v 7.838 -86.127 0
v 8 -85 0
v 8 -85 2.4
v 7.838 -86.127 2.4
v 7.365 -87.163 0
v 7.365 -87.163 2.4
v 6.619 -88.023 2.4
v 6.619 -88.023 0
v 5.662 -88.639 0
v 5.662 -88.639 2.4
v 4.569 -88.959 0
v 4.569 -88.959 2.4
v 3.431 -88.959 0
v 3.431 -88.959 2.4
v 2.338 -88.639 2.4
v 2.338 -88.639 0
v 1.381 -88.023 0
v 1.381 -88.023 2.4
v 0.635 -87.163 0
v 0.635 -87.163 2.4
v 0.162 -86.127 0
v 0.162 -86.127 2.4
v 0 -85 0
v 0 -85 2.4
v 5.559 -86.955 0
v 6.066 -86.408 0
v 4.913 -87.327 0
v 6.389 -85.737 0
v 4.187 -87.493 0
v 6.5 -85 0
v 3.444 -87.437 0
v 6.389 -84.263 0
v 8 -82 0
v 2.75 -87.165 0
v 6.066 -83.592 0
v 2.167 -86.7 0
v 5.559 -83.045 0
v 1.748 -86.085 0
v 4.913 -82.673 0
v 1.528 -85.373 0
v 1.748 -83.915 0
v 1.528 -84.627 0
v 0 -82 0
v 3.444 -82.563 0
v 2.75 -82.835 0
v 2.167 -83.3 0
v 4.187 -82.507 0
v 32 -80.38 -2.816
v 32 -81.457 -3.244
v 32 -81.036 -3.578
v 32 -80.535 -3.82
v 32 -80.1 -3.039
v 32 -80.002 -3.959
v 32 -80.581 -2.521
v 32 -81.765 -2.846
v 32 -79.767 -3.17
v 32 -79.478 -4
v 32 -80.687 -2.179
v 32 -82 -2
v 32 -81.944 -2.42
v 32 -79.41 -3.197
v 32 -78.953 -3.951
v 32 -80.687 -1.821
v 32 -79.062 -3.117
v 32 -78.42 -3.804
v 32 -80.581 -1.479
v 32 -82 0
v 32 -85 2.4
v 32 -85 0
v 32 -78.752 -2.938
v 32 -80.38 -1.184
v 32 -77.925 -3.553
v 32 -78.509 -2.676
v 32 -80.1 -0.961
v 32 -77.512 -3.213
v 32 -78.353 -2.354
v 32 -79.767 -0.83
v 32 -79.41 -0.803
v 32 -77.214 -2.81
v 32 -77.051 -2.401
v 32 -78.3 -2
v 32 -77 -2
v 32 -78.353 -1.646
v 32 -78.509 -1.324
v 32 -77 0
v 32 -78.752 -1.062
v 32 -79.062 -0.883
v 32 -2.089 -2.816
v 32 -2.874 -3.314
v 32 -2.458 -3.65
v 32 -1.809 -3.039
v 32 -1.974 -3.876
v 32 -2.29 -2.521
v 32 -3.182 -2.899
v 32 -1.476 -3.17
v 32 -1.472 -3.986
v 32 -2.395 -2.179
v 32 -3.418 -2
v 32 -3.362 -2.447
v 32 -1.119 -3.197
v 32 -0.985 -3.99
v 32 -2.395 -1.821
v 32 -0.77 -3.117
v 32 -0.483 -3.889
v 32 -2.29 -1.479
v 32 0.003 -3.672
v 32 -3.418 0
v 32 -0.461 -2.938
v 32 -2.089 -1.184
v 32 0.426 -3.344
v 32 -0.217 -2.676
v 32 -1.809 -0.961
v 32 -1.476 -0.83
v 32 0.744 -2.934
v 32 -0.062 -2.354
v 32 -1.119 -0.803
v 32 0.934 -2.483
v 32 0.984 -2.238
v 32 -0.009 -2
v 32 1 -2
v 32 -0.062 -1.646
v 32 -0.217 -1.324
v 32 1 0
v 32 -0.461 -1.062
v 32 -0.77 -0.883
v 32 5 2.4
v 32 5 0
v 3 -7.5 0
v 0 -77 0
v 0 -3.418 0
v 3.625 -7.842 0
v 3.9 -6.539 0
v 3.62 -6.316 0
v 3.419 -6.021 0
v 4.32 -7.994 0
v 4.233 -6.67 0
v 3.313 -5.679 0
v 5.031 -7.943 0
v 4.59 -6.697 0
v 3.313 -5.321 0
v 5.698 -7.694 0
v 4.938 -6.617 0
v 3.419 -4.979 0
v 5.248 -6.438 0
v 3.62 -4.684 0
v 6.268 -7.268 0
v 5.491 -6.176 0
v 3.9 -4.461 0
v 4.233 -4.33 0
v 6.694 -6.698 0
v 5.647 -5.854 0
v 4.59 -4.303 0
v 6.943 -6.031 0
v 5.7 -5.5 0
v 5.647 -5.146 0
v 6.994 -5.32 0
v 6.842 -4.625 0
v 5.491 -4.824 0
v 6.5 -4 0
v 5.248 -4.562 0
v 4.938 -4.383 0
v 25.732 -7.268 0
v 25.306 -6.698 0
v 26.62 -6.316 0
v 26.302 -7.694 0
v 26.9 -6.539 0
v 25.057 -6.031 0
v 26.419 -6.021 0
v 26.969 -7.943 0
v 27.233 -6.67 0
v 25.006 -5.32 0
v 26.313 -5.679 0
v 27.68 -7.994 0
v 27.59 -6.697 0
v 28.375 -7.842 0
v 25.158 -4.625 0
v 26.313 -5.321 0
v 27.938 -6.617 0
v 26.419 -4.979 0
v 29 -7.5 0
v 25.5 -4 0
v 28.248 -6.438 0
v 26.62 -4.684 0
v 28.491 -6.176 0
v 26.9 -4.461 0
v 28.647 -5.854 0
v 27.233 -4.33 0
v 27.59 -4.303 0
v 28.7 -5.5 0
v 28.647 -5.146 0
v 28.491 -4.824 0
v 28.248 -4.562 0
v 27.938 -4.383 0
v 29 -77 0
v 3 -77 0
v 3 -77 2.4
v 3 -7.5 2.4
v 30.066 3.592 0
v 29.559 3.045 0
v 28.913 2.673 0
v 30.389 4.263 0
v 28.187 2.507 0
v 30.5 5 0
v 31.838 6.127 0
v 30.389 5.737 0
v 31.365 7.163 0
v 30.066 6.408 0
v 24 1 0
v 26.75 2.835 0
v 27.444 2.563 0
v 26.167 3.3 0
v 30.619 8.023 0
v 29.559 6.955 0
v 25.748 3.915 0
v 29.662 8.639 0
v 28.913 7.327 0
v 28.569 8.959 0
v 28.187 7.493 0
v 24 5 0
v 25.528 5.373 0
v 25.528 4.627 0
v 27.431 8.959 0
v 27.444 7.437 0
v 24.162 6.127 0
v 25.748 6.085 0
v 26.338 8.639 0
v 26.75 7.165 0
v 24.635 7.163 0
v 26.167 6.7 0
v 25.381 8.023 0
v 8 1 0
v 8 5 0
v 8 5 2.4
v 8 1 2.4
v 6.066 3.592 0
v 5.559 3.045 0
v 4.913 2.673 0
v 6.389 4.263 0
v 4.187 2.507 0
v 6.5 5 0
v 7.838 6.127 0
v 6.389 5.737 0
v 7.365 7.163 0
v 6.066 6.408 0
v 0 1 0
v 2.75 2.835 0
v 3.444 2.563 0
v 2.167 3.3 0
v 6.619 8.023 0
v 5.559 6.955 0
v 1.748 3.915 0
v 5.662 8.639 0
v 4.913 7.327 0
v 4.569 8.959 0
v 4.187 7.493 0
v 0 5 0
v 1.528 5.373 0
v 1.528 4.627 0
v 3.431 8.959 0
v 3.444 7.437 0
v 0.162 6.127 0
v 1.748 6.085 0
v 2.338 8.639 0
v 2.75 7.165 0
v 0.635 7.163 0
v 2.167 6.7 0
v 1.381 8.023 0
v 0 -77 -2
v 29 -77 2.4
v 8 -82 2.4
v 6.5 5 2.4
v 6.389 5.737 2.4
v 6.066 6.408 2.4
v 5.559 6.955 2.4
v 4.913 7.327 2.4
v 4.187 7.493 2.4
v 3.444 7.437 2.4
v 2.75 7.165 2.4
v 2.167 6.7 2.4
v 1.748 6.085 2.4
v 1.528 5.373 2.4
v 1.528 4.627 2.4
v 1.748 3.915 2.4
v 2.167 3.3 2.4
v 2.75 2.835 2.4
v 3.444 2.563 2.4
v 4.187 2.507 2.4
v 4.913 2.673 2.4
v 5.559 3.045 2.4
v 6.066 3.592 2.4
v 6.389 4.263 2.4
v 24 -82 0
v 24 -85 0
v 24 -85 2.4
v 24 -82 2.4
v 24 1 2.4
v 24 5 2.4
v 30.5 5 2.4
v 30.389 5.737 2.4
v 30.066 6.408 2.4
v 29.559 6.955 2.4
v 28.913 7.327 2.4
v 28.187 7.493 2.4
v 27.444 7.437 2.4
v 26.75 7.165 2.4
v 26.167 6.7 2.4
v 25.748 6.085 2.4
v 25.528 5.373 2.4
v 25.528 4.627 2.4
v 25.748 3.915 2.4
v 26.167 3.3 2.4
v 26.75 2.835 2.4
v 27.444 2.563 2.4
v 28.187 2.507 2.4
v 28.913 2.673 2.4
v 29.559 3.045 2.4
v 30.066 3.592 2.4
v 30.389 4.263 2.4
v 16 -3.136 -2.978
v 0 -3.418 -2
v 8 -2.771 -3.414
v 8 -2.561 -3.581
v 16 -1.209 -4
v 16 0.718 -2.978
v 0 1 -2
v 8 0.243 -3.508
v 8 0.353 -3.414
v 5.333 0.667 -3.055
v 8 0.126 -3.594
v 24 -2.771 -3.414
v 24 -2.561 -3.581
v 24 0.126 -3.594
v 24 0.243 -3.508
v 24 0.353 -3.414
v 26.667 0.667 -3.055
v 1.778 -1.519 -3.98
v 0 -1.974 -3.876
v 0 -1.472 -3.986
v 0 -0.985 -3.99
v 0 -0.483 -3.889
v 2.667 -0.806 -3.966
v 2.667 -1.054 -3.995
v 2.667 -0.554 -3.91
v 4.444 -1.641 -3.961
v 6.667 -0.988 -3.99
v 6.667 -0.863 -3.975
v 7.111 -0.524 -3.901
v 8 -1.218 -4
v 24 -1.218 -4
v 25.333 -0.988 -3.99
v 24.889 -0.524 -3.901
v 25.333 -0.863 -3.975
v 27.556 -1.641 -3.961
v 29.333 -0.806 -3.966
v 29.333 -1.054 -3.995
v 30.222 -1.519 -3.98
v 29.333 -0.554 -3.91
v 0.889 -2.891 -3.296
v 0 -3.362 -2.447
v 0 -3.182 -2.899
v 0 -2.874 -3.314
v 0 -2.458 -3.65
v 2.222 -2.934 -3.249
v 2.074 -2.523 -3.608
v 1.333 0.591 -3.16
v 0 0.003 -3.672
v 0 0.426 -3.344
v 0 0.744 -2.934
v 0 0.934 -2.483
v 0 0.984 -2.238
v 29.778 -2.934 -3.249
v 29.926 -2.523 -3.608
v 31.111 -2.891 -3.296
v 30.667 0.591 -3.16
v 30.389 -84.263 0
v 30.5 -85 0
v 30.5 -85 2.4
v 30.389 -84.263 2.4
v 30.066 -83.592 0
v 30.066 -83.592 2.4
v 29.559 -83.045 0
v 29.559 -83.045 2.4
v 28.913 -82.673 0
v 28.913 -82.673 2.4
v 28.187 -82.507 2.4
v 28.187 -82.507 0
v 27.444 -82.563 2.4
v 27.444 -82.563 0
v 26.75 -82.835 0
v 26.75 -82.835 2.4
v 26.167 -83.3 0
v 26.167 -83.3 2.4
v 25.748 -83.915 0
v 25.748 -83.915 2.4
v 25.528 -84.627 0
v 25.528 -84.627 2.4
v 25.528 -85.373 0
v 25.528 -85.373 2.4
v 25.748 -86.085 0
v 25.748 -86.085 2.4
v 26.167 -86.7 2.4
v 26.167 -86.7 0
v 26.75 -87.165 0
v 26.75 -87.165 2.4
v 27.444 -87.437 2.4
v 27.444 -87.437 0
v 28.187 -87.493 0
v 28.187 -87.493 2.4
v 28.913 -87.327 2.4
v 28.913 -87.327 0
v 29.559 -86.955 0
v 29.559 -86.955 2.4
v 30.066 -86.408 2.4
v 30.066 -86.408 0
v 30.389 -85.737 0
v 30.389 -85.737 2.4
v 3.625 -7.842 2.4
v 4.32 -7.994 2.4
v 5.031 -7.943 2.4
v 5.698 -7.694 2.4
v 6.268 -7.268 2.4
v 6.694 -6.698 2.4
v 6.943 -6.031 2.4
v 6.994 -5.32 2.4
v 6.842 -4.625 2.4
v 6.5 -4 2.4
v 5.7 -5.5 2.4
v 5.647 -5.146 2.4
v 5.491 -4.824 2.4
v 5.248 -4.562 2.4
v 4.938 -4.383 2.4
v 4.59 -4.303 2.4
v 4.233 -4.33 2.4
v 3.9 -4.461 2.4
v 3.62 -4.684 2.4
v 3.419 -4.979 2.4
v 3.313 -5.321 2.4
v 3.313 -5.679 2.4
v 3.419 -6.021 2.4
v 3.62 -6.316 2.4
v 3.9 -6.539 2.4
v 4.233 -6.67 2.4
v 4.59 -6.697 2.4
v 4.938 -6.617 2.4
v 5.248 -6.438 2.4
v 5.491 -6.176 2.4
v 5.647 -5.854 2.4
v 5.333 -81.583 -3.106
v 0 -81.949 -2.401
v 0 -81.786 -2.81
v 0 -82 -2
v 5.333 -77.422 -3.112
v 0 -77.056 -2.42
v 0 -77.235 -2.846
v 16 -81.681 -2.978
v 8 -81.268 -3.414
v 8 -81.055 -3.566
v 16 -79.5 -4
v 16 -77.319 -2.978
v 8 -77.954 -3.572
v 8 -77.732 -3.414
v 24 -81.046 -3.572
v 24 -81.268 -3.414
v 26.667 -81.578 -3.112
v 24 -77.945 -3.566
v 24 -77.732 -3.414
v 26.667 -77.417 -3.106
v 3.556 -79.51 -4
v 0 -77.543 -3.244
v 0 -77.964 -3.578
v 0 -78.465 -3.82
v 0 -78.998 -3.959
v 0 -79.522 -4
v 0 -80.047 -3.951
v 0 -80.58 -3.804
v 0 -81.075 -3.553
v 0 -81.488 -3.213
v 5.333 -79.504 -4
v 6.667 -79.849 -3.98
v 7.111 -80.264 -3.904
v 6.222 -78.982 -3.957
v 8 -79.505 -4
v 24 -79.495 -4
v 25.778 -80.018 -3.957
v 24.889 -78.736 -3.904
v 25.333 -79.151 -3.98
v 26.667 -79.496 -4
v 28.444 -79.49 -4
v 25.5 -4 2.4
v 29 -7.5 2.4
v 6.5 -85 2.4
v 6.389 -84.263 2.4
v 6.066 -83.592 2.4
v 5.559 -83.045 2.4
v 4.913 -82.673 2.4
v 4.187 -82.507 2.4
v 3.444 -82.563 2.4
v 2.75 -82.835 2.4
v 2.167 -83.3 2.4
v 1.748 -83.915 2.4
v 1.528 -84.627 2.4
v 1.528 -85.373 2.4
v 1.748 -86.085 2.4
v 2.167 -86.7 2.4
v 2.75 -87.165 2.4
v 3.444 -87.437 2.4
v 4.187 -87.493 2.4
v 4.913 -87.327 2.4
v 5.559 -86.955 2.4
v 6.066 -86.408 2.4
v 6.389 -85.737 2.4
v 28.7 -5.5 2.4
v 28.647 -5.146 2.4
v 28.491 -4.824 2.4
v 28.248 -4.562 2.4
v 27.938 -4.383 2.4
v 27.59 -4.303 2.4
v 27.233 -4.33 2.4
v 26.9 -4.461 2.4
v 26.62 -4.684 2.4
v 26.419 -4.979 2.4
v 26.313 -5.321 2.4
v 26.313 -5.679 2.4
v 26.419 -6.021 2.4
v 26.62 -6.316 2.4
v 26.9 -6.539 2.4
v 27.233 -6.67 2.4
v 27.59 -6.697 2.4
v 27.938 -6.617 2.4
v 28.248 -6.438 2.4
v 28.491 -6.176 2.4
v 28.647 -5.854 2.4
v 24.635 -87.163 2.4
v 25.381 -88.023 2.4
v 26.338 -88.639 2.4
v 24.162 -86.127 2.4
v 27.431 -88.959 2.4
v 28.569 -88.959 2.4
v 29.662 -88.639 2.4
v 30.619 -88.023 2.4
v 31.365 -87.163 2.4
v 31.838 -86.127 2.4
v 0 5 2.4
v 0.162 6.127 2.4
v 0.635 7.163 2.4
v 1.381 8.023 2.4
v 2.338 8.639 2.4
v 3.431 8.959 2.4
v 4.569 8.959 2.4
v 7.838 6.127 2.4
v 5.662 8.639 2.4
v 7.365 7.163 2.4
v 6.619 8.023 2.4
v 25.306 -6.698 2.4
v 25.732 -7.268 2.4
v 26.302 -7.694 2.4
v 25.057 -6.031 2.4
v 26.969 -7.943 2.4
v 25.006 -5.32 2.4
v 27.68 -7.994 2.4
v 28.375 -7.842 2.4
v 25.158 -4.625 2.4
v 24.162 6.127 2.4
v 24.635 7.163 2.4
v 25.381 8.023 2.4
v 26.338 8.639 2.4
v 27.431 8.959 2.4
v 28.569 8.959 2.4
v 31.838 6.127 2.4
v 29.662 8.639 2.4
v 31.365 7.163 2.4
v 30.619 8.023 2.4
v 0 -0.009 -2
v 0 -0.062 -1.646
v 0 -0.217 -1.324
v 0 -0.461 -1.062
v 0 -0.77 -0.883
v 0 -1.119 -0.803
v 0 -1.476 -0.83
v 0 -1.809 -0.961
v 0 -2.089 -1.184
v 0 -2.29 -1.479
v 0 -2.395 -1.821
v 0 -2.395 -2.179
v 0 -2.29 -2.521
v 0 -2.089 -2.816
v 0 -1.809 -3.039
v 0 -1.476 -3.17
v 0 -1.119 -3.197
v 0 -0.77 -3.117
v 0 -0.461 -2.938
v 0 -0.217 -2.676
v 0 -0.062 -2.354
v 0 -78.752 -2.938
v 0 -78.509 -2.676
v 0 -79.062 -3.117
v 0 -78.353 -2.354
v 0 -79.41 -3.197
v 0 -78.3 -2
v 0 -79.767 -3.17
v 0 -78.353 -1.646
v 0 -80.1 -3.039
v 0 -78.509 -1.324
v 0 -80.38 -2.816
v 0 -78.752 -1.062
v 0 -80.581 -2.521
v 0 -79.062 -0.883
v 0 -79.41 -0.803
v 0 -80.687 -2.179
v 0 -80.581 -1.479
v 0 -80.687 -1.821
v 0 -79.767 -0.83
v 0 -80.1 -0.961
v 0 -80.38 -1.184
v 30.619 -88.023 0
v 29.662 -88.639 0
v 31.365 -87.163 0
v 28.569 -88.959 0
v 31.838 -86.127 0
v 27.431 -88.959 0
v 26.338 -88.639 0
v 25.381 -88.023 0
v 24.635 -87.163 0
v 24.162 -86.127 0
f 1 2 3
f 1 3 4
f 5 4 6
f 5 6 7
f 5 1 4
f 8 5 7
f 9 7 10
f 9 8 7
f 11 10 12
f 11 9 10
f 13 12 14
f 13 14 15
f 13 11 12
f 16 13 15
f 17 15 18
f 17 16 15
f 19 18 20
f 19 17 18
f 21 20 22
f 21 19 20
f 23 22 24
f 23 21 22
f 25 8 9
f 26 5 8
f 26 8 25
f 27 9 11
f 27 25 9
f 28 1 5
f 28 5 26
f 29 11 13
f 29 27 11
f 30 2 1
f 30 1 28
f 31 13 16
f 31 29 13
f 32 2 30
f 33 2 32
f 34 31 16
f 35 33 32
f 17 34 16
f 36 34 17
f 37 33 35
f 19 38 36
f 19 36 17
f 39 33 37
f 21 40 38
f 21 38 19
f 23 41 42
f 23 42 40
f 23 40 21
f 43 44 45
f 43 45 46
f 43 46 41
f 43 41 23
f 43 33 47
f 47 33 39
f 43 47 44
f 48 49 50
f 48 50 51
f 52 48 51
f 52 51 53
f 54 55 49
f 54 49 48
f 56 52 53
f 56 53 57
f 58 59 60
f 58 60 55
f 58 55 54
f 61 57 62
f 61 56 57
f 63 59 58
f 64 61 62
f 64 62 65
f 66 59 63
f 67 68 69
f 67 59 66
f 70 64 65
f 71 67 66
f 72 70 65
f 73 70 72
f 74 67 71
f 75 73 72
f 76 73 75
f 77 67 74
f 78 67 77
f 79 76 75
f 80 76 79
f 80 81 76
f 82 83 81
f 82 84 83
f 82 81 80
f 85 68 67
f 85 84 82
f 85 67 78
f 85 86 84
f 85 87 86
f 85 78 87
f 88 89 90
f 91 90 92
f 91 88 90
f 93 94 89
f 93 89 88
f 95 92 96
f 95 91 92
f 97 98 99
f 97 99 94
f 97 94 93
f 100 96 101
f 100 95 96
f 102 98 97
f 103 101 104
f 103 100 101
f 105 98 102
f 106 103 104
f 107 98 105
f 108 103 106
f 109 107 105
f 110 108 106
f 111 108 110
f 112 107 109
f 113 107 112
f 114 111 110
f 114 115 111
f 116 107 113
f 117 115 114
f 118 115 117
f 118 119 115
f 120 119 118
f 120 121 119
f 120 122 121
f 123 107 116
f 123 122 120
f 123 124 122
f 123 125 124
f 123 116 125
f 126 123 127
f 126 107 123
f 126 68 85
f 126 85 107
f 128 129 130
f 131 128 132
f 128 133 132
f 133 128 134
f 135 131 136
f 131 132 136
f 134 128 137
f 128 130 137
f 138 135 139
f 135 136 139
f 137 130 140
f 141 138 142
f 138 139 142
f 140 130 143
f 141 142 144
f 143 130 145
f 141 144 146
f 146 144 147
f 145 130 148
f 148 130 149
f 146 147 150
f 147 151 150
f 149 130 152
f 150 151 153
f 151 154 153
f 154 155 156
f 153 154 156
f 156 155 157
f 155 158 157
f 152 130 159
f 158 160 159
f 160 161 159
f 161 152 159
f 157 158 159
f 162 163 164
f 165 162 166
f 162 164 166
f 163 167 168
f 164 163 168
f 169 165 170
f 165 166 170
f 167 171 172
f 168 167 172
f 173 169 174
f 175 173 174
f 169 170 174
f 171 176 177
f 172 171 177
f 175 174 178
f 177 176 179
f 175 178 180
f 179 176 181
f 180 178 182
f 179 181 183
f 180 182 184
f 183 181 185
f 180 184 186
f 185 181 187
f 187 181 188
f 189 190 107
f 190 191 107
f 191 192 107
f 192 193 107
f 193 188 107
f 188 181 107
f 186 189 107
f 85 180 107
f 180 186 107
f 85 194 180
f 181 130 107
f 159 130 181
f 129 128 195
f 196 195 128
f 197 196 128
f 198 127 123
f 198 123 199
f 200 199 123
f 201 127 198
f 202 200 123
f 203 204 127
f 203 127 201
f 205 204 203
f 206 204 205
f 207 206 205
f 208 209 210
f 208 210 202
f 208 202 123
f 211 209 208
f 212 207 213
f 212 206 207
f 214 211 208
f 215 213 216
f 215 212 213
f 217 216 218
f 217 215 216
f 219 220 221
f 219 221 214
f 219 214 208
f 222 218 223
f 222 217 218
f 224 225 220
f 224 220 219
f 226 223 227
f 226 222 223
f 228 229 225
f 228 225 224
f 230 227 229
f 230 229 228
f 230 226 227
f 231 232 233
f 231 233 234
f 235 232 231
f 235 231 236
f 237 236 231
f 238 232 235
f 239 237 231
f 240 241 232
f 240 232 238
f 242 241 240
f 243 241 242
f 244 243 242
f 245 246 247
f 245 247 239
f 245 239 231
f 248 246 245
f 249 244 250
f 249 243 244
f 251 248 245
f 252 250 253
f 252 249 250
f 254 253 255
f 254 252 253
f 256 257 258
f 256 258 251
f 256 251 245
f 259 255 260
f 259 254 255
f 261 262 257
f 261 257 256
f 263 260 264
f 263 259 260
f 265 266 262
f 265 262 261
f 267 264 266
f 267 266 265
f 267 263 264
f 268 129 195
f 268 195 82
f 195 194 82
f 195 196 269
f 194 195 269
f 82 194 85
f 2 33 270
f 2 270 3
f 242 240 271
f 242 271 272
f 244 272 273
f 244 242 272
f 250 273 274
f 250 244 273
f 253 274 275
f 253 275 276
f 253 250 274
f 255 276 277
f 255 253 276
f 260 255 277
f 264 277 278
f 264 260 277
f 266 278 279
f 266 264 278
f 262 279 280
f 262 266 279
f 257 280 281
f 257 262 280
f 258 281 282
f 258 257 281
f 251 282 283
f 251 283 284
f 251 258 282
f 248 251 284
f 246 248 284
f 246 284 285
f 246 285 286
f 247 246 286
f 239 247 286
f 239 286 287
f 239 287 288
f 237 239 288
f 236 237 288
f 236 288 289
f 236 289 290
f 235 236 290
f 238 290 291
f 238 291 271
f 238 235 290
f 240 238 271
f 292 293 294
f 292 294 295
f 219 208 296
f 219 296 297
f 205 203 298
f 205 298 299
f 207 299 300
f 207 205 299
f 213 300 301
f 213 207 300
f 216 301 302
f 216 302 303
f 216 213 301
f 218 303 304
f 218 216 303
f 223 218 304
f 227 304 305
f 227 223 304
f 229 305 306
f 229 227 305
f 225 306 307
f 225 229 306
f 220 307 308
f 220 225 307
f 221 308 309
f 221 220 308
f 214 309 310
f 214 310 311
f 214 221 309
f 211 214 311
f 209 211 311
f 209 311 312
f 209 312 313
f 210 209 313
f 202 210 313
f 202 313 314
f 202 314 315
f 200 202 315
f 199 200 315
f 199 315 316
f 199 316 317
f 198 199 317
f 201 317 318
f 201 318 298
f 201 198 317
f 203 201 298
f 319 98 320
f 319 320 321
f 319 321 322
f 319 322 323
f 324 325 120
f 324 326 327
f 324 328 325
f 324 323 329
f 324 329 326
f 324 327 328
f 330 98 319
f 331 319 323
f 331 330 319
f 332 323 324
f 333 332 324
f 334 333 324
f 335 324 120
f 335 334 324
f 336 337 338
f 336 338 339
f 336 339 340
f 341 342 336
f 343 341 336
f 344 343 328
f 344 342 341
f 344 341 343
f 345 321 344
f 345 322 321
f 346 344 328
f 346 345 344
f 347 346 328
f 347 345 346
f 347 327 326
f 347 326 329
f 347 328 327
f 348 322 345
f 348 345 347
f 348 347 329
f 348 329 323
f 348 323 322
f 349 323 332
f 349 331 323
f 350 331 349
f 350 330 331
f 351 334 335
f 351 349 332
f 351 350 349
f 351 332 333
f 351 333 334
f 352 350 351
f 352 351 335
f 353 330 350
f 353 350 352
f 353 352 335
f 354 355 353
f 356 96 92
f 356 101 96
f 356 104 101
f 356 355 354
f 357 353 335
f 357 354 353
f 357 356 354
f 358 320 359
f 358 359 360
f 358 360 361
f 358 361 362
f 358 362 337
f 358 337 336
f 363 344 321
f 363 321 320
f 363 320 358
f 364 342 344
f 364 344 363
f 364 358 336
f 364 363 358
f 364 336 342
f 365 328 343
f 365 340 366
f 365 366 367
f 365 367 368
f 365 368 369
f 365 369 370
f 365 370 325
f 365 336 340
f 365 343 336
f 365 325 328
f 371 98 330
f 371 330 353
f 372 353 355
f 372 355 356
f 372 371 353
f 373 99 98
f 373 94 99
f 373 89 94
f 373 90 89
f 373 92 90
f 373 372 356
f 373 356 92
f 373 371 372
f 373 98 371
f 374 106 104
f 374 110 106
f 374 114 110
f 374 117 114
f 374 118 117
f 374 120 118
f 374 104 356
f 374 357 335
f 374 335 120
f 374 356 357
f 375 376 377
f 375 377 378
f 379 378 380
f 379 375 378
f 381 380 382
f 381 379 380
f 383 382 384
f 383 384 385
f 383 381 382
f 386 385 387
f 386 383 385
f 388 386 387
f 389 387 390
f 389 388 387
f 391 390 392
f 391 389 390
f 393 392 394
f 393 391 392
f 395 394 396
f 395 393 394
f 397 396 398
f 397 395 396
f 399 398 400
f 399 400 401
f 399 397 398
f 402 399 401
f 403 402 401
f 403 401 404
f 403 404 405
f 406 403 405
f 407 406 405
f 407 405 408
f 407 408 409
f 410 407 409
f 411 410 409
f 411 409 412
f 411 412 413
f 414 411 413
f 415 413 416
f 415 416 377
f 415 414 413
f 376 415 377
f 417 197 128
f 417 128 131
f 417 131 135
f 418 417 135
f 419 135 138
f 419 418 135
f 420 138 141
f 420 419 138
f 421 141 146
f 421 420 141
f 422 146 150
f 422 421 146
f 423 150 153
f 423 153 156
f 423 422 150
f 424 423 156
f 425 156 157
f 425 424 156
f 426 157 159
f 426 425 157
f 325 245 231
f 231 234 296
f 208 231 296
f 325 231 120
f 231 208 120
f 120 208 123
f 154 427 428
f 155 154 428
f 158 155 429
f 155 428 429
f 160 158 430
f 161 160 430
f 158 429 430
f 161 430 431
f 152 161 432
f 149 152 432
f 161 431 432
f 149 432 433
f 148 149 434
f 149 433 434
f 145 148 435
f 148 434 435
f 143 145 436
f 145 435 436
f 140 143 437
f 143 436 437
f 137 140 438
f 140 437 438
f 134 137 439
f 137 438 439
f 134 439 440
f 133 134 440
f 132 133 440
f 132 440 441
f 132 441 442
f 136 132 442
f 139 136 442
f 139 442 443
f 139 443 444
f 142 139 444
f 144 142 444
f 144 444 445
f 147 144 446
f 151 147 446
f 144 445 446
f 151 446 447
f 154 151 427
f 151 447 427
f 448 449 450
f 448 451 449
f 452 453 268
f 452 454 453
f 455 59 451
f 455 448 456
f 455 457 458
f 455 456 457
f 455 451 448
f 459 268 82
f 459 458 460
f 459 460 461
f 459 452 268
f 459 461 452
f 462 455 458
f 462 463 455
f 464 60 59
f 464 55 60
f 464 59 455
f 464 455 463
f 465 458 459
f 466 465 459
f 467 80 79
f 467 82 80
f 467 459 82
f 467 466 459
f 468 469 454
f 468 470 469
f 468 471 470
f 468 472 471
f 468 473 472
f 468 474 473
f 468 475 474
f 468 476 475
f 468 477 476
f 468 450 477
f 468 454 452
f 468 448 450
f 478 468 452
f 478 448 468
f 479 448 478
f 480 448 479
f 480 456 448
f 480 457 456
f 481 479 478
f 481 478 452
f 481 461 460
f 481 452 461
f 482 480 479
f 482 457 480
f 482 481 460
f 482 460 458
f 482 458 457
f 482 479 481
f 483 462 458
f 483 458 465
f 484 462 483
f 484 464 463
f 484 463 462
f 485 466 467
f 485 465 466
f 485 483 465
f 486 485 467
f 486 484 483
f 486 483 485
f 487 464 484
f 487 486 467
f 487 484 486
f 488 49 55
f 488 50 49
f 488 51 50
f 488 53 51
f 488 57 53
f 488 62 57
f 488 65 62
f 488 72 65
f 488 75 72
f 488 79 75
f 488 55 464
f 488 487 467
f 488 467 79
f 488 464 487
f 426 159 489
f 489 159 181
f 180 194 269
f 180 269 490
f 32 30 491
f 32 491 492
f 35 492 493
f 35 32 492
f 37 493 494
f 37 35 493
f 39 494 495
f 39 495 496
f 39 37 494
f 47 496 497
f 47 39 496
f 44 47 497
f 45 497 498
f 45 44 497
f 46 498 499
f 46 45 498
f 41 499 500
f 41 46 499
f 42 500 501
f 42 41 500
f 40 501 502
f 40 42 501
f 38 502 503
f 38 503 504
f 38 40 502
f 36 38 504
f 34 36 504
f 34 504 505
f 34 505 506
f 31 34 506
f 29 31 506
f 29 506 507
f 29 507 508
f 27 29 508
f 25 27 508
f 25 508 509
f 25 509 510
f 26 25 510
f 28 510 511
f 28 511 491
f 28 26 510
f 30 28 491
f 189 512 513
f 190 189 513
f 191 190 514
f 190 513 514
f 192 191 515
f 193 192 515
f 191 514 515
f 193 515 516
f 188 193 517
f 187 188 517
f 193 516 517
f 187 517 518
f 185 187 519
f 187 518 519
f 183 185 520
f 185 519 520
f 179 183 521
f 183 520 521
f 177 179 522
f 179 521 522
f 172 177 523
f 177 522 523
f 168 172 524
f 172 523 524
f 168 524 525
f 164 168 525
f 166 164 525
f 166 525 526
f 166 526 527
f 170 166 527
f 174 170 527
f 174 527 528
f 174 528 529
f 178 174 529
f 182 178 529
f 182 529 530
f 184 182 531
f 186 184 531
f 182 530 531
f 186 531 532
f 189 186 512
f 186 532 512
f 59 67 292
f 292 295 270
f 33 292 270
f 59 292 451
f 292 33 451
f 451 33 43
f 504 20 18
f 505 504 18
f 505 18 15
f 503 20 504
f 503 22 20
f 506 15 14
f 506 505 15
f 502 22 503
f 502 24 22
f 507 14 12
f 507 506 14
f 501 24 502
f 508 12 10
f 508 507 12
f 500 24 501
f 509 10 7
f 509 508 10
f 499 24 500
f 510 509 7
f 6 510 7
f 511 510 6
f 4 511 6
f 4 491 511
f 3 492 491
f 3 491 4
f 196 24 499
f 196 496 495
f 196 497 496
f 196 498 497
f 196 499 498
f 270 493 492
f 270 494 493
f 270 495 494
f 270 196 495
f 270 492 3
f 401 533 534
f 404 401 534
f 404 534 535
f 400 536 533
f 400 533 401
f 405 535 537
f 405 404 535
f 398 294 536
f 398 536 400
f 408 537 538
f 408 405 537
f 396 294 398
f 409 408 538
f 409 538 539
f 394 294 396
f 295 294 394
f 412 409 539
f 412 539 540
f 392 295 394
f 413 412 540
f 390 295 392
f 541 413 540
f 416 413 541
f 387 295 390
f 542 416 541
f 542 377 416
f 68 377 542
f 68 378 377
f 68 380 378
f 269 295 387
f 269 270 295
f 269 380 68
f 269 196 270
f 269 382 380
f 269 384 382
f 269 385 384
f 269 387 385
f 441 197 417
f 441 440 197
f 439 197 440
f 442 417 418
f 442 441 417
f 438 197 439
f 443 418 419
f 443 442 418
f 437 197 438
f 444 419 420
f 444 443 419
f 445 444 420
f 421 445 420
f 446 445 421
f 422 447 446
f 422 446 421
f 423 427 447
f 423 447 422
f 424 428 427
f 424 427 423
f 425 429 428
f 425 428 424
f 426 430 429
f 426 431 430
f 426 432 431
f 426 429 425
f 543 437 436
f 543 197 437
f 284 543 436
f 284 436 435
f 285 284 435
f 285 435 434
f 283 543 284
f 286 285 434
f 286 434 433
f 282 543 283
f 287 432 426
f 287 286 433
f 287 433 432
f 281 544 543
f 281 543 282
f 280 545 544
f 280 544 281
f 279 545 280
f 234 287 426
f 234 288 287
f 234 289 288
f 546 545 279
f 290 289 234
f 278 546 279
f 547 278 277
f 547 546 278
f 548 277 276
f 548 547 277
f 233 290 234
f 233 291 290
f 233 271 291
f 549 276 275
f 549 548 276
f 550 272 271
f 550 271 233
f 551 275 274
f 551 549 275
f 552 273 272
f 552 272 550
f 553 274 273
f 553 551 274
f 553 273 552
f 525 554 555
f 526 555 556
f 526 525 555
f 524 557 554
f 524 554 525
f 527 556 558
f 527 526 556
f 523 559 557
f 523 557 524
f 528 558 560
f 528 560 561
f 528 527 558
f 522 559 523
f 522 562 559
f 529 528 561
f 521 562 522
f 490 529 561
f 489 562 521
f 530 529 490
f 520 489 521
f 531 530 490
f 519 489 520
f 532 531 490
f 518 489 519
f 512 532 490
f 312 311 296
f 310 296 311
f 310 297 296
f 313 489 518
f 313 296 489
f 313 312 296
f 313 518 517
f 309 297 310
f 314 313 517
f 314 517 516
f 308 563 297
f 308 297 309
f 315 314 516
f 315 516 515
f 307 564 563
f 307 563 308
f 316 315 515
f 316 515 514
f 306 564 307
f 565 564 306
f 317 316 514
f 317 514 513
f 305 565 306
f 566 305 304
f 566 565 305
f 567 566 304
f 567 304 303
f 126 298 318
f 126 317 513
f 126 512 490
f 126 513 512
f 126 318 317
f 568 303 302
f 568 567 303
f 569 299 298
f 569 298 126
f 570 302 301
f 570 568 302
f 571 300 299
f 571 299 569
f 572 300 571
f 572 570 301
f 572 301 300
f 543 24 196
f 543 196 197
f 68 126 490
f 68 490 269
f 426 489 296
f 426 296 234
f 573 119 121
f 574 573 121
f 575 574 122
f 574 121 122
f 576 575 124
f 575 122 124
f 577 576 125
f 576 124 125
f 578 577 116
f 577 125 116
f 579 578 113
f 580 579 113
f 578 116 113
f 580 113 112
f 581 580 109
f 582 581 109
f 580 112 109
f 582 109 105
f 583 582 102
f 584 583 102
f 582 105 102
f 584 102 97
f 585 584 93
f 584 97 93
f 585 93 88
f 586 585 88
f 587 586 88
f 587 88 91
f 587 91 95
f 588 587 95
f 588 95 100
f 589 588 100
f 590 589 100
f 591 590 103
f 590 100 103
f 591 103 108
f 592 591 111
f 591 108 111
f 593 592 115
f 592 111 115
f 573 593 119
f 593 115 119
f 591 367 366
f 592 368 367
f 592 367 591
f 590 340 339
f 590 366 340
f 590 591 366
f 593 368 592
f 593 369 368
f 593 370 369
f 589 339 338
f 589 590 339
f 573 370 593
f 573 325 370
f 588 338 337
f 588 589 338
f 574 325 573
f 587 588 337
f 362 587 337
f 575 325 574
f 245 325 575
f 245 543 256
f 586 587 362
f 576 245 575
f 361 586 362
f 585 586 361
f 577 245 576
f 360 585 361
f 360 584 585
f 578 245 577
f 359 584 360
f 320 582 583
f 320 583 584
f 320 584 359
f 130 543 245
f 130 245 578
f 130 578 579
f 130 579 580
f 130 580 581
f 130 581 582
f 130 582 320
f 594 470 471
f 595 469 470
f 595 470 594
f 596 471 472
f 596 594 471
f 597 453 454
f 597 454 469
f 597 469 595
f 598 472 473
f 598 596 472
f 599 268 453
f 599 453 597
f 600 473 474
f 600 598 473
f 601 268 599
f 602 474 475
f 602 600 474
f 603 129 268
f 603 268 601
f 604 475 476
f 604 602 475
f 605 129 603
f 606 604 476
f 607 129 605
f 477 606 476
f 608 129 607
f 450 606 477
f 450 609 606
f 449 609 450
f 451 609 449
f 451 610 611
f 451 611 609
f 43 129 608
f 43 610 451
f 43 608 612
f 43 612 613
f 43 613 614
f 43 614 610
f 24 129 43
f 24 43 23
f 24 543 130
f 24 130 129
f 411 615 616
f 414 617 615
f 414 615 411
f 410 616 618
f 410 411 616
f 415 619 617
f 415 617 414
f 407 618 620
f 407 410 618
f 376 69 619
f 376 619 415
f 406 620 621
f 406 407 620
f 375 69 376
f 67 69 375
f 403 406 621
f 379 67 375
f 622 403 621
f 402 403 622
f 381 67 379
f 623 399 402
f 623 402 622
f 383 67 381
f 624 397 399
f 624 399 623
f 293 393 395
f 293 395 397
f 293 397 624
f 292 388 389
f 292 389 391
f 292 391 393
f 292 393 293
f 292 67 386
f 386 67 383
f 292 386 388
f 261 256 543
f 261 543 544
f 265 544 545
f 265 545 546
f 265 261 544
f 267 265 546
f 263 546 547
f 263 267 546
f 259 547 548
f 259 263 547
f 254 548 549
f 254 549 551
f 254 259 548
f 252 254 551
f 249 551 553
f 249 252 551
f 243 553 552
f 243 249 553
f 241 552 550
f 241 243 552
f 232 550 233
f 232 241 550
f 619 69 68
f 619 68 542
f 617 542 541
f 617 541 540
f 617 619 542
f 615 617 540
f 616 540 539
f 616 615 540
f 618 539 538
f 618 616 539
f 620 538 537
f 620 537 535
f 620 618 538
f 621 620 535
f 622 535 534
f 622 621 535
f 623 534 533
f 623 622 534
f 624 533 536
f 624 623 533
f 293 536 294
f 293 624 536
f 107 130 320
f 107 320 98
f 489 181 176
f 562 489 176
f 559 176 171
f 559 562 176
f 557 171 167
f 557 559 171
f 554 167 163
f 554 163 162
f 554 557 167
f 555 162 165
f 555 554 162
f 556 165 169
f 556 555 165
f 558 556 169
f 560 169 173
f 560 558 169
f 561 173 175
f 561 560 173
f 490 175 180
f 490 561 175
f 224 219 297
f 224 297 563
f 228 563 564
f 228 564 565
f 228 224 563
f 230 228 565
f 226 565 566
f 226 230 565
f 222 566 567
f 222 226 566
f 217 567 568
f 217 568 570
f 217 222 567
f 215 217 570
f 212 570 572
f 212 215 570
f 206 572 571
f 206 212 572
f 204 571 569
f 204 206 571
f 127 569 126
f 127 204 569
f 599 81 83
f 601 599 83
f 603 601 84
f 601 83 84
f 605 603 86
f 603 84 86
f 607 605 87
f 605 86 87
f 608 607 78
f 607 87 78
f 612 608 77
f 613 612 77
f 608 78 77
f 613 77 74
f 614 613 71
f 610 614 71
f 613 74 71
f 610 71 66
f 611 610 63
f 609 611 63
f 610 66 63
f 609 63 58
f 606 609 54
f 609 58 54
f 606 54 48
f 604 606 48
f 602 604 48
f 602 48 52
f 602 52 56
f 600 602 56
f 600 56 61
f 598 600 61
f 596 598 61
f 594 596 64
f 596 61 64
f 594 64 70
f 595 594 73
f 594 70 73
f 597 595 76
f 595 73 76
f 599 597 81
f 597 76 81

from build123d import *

# Parameters (mm, degrees)
SKETCH1_R           = 2.5
SKETCH1_W           = 26
SKETCH1_H           = 73
BOSS_EXTRUDE1_DEPTH = 2.4
BOSS_EXTRUDE2_DEPTH = 4
SKETCH4_R           = 1.2
CUT_EXTRUDE1_DEPTH  = 32
SKETCH5_R           = 1.2
CUT_EXTRUDE2_DEPTH  = 32
SKETCH6_R           = 2.5
BOSS_EXTRUDE3_DEPTH = 2.4
SKETCH7_R           = 1.2
CUT_EXTRUDE3_DEPTH  = 2.4


with BuildPart() as part:
    # Sketch1 → Boss-Extrude1 (new body)
    with BuildSketch(Plane.XY):
        with BuildLine():
            Line((8, 1), (24, 1))
            Line((24, 1), (24, 5))
            ThreePointArc((24, 5), (28, 9), (32, 5))
            Line((32, 5), (32, 0))
            Line((32, 0), (32, -80))
            Line((32, -80), (32, -85))
            ThreePointArc((32, -85), (28, -89), (24, -85))
            Line((24, -85), (24, -82))
            Line((24, -82), (8, -82))
            Line((8, -82), (8, -85))
            ThreePointArc((8, -85), (4, -89), (0, -85))
            Line((0, -85), (0, -80))
            Line((0, -80), (0, 0))
            Line((0, 0), (0, 5))
            ThreePointArc((0, 5), (4, 9), (8, 5))
            Line((8, 5), (8, 1))
        make_face()
        with Locations((4, 5)):
            Circle(SKETCH1_R, mode=Mode.SUBTRACT)
        with Locations((28, 5)):
            Circle(SKETCH1_R, mode=Mode.SUBTRACT)
        with Locations((28, -85)):
            Circle(SKETCH1_R, mode=Mode.SUBTRACT)
        with Locations((4, -85)):
            Circle(SKETCH1_R, mode=Mode.SUBTRACT)
        with Locations((16, -40.5)):
            Rectangle(SKETCH1_W, SKETCH1_H, mode=Mode.SUBTRACT)
    extrude(amount=BOSS_EXTRUDE1_DEPTH)

    # Sketch3 → Boss-Extrude2 (add)
    with BuildSketch(Plane(origin=(0, 0, 0), x_dir=(-1, 0, 0), z_dir=(0, 0, -1))):
        Polygon((0, -3.417769462), (-32, -3.417769462), (-32, 1), (-24, 1), (0, 1), align=None)
        Polygon((-29, -77), (-8, -77), (0, -77), (0, -82), (-8, -82), (-32, -82), (-32, -77), align=None)
    extrude(amount=BOSS_EXTRUDE2_DEPTH)

    # Sketch4 → Cut-Extrude1 (cut)
    with BuildSketch(Plane(origin=(32, 0, 0), x_dir=(0, 0, -1), z_dir=(1, 0, 0))):
        with Locations(Location((2, -1.208884731, 0), (0, 0, 90))):
            Circle(SKETCH4_R)
        with BuildLine():
            Line((2, 1), (3.187335187, 3.129123663))
            Line((3.187335187, 3.129123663), (6.104231783, 0.827853484))
            Line((6.104231783, 0.827853484), (6.104231783, -5.123201884))
            Line((6.104231783, -5.123201884), (2, -5.123201884))
            Line((2, -5.123201884), (2, -3.417769462))
            add(Edge.make_bspline(
                [(2, -3.417769462), (4, -3.417769462), (4, -1.208884731), (4, 1), (2, 1)],
                knots=[3.141592654, 3.141592654, 3.141592654, 4.71238898, 4.71238898, 6.283185307, 6.283185307, 6.283185307], degree=2, weights=[1, 0.707106781, 1, 0.707106781, 1]))
        make_face()
    extrude(amount=-CUT_EXTRUDE1_DEPTH, mode=Mode.SUBTRACT)

    # Sketch5 → Cut-Extrude2 (cut)
    with BuildSketch(Plane(origin=(32, 0, 0), x_dir=(0, 0, -1), z_dir=(1, 0, 0))):
        with Locations(Location((2, -79.5, 0), (0, 0, 90))):
            Circle(SKETCH5_R)
        with BuildLine():
            Line((2, -77), (2, -72.799584349))
            Line((2, -72.799584349), (8.579388068, -72.799584349))
            Line((8.579388068, -72.799584349), (8.579388068, -85.039779738))
            Line((8.579388068, -85.039779738), (2, -85.039779738))
            Line((2, -85.039779738), (2, -82))
            add(Edge.make_bspline(
                [(2, -82), (4, -82), (4, -79.5), (4, -77), (2, -77)],
                knots=[3.141592654, 3.141592654, 3.141592654, 4.71238898, 4.71238898, 6.283185307, 6.283185307, 6.283185307], degree=2, weights=[1, 0.707106781, 1, 0.707106781, 1]))
        make_face()
    extrude(amount=-CUT_EXTRUDE2_DEPTH, mode=Mode.SUBTRACT)

    # Sketch6 → Boss-Extrude3 (add)
    with BuildSketch(Plane.XY.offset(2.4)):
        with Locations((4.5, -5.5)):
            Circle(SKETCH6_R)
        with Locations((27.5, -5.5)):
            Circle(SKETCH6_R)
    extrude(amount=-BOSS_EXTRUDE3_DEPTH)

    # Sketch7 → Cut-Extrude3 (cut)
    with BuildSketch(Plane.XY.offset(2.4)):
        with Locations((4.5, -5.5)):
            Circle(SKETCH7_R)
        with Locations((27.5, -5.5)):
            Circle(SKETCH7_R)
    extrude(amount=-CUT_EXTRUDE3_DEPTH, mode=Mode.SUBTRACT)


solid = part.part
